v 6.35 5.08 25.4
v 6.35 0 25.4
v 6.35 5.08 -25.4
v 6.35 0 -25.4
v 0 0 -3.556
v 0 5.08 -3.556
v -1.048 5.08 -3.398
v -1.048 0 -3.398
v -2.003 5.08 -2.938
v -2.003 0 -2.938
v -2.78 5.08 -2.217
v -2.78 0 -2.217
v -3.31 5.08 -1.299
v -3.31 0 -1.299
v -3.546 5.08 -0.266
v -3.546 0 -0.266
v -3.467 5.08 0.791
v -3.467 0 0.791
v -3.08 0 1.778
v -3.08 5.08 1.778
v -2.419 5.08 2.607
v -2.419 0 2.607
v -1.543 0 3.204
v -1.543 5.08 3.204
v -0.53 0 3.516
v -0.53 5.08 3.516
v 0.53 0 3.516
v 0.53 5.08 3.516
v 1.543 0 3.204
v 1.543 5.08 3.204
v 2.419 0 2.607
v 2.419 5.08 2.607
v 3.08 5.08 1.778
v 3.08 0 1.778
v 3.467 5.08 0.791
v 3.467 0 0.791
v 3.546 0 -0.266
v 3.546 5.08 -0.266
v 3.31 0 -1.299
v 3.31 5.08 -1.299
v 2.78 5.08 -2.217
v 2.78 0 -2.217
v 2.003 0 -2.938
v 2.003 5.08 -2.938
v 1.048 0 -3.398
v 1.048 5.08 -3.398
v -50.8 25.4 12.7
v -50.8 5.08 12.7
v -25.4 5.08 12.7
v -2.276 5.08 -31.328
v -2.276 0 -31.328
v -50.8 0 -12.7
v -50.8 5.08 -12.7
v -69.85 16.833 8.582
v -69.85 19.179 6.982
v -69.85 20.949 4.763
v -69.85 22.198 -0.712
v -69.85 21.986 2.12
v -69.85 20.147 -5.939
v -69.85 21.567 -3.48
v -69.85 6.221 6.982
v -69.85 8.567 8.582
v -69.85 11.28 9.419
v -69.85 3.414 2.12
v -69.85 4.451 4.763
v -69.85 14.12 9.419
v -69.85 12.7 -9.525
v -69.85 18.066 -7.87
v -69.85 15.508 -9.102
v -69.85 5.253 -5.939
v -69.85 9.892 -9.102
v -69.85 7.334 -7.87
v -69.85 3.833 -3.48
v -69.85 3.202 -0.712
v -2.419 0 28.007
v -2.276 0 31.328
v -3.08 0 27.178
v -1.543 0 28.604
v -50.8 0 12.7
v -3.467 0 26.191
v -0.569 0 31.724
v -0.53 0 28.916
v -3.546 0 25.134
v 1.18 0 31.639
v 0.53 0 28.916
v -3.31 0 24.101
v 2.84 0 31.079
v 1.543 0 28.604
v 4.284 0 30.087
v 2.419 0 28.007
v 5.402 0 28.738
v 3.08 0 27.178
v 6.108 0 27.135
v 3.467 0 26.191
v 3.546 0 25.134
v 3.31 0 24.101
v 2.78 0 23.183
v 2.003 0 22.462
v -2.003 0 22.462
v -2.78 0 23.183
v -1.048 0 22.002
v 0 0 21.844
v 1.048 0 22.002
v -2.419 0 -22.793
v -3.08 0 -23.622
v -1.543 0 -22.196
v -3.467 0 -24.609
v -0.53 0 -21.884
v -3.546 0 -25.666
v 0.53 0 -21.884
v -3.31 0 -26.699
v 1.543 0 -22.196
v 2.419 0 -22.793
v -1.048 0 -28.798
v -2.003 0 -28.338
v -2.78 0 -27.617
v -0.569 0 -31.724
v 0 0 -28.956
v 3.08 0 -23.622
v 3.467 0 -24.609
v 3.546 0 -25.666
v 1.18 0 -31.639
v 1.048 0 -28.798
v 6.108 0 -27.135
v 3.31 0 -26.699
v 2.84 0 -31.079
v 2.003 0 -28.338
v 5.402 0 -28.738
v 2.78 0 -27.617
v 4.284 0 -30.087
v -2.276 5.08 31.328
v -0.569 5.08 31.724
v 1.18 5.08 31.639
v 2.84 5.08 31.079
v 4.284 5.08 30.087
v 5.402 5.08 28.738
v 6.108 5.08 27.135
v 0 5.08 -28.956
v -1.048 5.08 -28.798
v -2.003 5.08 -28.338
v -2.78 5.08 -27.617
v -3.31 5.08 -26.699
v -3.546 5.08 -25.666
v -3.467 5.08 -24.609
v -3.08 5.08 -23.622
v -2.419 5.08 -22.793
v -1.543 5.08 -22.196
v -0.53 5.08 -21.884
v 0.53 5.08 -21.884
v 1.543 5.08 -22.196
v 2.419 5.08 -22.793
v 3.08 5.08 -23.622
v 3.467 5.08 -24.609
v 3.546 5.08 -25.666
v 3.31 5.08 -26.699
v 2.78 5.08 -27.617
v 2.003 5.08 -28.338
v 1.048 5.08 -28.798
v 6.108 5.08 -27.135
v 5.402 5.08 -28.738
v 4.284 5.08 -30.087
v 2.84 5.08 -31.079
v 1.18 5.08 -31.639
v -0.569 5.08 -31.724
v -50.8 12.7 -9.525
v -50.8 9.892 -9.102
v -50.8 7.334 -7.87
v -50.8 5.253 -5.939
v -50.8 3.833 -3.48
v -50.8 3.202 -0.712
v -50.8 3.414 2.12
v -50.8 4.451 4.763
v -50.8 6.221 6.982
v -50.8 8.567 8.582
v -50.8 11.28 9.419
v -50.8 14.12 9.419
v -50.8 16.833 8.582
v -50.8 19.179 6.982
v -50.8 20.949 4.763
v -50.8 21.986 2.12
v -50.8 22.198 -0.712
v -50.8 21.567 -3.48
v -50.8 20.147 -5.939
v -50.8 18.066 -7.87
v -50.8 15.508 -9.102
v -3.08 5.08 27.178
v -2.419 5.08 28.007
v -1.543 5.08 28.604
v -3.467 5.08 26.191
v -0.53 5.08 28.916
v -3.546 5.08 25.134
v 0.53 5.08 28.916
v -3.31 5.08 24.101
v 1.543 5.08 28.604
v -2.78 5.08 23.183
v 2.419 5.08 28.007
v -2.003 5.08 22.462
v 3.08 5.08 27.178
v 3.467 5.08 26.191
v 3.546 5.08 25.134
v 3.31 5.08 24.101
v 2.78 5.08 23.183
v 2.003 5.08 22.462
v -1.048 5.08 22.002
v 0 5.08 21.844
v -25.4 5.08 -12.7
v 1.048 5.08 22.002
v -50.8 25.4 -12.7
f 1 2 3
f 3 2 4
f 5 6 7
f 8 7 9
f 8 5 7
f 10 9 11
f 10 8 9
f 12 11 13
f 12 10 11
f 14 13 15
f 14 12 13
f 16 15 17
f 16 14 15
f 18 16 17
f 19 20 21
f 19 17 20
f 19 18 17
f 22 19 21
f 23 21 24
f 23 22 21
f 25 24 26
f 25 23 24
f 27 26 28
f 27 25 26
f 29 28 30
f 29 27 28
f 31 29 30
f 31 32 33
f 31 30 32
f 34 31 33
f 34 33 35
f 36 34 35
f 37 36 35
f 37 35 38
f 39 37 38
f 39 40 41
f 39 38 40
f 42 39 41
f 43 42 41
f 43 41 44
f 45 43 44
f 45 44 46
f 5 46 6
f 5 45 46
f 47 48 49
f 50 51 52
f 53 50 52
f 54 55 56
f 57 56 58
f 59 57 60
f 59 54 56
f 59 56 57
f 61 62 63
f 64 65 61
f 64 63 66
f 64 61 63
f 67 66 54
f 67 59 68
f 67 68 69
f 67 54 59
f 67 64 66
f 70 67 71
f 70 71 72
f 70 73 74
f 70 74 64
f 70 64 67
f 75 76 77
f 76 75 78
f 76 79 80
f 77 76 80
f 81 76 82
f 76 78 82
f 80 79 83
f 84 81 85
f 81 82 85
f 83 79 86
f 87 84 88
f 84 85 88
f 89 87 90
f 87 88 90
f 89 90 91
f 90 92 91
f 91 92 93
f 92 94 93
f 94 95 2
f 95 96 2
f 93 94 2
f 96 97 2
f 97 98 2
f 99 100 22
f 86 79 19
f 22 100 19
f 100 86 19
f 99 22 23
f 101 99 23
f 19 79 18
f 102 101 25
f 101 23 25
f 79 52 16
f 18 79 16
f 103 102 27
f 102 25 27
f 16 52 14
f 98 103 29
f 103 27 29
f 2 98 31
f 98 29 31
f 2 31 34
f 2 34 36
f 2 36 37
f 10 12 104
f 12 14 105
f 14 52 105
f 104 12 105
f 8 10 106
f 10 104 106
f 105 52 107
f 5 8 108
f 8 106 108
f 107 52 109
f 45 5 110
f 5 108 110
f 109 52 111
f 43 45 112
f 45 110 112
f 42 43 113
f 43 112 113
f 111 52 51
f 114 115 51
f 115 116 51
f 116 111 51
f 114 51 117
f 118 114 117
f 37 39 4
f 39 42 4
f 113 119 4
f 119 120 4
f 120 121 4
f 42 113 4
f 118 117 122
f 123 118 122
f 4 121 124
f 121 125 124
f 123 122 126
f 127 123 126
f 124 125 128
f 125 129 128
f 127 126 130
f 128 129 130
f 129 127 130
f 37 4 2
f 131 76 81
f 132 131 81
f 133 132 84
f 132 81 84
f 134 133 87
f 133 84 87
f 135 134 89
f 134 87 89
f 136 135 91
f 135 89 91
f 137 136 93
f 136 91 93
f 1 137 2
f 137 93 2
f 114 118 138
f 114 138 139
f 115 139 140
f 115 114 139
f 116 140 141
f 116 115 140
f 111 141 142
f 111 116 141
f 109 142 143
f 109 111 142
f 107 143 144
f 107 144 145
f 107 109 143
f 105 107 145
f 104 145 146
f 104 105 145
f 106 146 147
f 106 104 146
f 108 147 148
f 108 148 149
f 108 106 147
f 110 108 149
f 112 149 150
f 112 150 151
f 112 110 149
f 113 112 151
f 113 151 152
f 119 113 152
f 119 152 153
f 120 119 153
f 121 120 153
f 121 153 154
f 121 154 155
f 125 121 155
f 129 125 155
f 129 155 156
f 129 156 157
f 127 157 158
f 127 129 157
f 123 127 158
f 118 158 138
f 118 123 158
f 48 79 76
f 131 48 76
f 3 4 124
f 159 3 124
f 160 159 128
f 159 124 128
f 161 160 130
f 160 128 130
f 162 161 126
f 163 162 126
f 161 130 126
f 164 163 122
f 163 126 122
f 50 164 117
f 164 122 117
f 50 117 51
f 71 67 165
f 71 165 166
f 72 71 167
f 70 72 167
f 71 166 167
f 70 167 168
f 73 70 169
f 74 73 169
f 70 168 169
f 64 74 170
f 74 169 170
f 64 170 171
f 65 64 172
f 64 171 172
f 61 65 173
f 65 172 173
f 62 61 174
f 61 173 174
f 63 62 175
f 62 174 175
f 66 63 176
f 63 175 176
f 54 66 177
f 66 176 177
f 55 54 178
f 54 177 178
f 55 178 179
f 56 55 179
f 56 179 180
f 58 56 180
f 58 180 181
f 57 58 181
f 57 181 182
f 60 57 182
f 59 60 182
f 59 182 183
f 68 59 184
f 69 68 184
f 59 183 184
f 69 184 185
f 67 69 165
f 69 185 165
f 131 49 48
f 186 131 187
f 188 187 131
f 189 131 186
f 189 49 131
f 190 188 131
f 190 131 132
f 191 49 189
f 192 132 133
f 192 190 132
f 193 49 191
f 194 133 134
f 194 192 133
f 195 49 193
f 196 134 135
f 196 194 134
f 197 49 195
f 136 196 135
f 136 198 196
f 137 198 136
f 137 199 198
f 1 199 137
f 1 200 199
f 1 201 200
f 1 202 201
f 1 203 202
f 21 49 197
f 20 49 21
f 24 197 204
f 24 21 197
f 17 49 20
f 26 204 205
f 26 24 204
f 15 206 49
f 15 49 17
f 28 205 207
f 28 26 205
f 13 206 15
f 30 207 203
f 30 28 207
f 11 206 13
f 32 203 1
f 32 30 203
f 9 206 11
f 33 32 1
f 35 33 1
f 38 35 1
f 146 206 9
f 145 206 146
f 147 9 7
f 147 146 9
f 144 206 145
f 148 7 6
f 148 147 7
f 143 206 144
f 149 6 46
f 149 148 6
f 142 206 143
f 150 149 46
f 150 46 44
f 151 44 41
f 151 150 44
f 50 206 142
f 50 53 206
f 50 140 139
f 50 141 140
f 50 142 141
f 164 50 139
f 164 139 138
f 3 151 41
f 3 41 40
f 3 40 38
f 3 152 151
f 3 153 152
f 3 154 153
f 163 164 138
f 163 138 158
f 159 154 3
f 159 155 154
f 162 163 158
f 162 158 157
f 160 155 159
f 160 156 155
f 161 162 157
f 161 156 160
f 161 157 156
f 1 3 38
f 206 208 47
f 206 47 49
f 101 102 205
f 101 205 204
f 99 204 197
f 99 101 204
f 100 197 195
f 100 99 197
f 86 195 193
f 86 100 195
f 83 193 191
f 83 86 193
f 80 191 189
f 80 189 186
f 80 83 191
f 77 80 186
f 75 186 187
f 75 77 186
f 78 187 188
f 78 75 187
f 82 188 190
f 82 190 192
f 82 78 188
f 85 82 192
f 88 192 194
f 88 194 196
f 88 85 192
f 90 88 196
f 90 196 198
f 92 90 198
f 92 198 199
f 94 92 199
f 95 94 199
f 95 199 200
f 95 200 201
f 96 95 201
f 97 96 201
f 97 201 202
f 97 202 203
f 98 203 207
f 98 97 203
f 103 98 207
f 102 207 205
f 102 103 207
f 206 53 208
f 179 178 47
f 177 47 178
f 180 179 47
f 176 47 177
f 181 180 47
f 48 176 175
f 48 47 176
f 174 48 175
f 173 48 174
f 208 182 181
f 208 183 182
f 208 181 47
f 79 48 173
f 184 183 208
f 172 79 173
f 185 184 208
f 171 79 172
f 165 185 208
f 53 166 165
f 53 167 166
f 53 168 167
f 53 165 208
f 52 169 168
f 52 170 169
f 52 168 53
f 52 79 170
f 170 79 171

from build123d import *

# Parameters (mm, degrees)
SKETCH2_W           = 25.4
SKETCH2_H           = 25.4
BOSS_EXTRUDE1_DEPTH = 25.4
BOSS_EXTRUDE2_DEPTH = 5.08
SKETCH5_R           = 3.556
CUT_EXTRUDE1_DEPTH  = 5.08
SKETCH6_R           = 3.556
CUT_EXTRUDE2_DEPTH  = 5.08
CUT_EXTRUDE3_DEPTH  = 25.4
SKETCH10_R          = 9.525
BOSS_EXTRUDE3_DEPTH = 19.05
CUT_EXTRUDE4_REACH  = 82.822
SKETCH12_R          = 3.556


with BuildPart() as part:
    # Sketch2 → Boss-Extrude1 (new body)
    with BuildSketch(Plane(origin=(0, 0, 0), x_dir=(1, 0, 0), z_dir=(0, 1, 0))):
        with Locations((-38.1, 0)):
            Rectangle(SKETCH2_W, SKETCH2_H)
    extrude(amount=BOSS_EXTRUDE1_DEPTH)

    # Sketch8 → Cut-Extrude3 (cut)
    with BuildSketch(Plane(origin=(0, 0, -12.7), x_dir=(-1, 0, 0), z_dir=(0, 0, -1))):
        Polygon((50.8, 25.4), (25.4, 5.08), (25.4, 25.4), align=None)
    extrude(amount=-CUT_EXTRUDE3_DEPTH, mode=Mode.SUBTRACT)



with BuildPart() as body_2:
    # Sketch4 → Boss-Extrude2 (new body)
    with BuildSketch(Plane(origin=(0, 0, 0), x_dir=(1, 0, 0), z_dir=(0, 1, 0))):
        with BuildLine():
            Line((-50.8, -12.7), (-2.275658989, -31.327921356))
            ThreePointArc((-2.275658989, -31.327921356), (3.596462869, -30.633003943), (6.349714595, -25.4))
            Line((6.349714595, -25.4), (6.35, 25.4))
            ThreePointArc((6.35, 25.4), (3.596610154, 30.633249029), (-2.275793827, 31.328175306))
            Line((-2.275793827, 31.328175306), (-50.8, 12.7))
            Line((-50.8, 12.7), (-50.8, -12.7))
        make_face()
    extrude(amount=BOSS_EXTRUDE2_DEPTH)

    # Sketch5 → Cut-Extrude1 (cut)
    with BuildSketch(Plane(origin=(0, 0, 0), x_dir=(1, 0, 0), z_dir=(0, 1, 0))):
        with Locations(Location((0, -25.4, 0), (0, 0, 90))):
            Circle(SKETCH5_R)
    extrude(amount=CUT_EXTRUDE1_DEPTH, mode=Mode.SUBTRACT)

    # Sketch6 → Cut-Extrude2 (cut)
    with BuildSketch(Plane(origin=(0, 0, 0), x_dir=(1, 0, 0), z_dir=(0, 1, 0))):
        with Locations(Location((0, 25.4, 0), (0, 0, 90))):
            Circle(SKETCH6_R)
    extrude(amount=CUT_EXTRUDE2_DEPTH, mode=Mode.SUBTRACT)


with BuildPart() as part_1:
    add(part.part)

    add(body_2.part)  # Boss-Extrude3 merges body 2
    # Sketch10 → Boss-Extrude3 (add)
    with BuildSketch(Plane.ZY.offset(50.8)):
        with Locations(Location((0, 12.7, 0), (0, 0, 180))):
            Circle(SKETCH10_R)
    extrude(amount=BOSS_EXTRUDE3_DEPTH)

    # Sketch12 → Cut-Extrude4 (cut, up to next)
    with BuildSketch(Plane(origin=(0, 0, 0), x_dir=(1, 0, 0), z_dir=(0, 1, 0)), mode=Mode.PRIVATE) as cut_extrude4_sk1:
        with Locations(Location((0, 0, 0), (0, 0, 90))):
            Circle(SKETCH12_R)
    cut_extrude4_tool1 = extrude(cut_extrude4_sk1.sketch, amount=CUT_EXTRUDE4_REACH, mode=Mode.PRIVATE) & part_1.part
    add(cut_extrude4_tool1.solids().sort_by_distance((0, 0, 0))[0], mode=Mode.SUBTRACT)


solid = part_1.part
